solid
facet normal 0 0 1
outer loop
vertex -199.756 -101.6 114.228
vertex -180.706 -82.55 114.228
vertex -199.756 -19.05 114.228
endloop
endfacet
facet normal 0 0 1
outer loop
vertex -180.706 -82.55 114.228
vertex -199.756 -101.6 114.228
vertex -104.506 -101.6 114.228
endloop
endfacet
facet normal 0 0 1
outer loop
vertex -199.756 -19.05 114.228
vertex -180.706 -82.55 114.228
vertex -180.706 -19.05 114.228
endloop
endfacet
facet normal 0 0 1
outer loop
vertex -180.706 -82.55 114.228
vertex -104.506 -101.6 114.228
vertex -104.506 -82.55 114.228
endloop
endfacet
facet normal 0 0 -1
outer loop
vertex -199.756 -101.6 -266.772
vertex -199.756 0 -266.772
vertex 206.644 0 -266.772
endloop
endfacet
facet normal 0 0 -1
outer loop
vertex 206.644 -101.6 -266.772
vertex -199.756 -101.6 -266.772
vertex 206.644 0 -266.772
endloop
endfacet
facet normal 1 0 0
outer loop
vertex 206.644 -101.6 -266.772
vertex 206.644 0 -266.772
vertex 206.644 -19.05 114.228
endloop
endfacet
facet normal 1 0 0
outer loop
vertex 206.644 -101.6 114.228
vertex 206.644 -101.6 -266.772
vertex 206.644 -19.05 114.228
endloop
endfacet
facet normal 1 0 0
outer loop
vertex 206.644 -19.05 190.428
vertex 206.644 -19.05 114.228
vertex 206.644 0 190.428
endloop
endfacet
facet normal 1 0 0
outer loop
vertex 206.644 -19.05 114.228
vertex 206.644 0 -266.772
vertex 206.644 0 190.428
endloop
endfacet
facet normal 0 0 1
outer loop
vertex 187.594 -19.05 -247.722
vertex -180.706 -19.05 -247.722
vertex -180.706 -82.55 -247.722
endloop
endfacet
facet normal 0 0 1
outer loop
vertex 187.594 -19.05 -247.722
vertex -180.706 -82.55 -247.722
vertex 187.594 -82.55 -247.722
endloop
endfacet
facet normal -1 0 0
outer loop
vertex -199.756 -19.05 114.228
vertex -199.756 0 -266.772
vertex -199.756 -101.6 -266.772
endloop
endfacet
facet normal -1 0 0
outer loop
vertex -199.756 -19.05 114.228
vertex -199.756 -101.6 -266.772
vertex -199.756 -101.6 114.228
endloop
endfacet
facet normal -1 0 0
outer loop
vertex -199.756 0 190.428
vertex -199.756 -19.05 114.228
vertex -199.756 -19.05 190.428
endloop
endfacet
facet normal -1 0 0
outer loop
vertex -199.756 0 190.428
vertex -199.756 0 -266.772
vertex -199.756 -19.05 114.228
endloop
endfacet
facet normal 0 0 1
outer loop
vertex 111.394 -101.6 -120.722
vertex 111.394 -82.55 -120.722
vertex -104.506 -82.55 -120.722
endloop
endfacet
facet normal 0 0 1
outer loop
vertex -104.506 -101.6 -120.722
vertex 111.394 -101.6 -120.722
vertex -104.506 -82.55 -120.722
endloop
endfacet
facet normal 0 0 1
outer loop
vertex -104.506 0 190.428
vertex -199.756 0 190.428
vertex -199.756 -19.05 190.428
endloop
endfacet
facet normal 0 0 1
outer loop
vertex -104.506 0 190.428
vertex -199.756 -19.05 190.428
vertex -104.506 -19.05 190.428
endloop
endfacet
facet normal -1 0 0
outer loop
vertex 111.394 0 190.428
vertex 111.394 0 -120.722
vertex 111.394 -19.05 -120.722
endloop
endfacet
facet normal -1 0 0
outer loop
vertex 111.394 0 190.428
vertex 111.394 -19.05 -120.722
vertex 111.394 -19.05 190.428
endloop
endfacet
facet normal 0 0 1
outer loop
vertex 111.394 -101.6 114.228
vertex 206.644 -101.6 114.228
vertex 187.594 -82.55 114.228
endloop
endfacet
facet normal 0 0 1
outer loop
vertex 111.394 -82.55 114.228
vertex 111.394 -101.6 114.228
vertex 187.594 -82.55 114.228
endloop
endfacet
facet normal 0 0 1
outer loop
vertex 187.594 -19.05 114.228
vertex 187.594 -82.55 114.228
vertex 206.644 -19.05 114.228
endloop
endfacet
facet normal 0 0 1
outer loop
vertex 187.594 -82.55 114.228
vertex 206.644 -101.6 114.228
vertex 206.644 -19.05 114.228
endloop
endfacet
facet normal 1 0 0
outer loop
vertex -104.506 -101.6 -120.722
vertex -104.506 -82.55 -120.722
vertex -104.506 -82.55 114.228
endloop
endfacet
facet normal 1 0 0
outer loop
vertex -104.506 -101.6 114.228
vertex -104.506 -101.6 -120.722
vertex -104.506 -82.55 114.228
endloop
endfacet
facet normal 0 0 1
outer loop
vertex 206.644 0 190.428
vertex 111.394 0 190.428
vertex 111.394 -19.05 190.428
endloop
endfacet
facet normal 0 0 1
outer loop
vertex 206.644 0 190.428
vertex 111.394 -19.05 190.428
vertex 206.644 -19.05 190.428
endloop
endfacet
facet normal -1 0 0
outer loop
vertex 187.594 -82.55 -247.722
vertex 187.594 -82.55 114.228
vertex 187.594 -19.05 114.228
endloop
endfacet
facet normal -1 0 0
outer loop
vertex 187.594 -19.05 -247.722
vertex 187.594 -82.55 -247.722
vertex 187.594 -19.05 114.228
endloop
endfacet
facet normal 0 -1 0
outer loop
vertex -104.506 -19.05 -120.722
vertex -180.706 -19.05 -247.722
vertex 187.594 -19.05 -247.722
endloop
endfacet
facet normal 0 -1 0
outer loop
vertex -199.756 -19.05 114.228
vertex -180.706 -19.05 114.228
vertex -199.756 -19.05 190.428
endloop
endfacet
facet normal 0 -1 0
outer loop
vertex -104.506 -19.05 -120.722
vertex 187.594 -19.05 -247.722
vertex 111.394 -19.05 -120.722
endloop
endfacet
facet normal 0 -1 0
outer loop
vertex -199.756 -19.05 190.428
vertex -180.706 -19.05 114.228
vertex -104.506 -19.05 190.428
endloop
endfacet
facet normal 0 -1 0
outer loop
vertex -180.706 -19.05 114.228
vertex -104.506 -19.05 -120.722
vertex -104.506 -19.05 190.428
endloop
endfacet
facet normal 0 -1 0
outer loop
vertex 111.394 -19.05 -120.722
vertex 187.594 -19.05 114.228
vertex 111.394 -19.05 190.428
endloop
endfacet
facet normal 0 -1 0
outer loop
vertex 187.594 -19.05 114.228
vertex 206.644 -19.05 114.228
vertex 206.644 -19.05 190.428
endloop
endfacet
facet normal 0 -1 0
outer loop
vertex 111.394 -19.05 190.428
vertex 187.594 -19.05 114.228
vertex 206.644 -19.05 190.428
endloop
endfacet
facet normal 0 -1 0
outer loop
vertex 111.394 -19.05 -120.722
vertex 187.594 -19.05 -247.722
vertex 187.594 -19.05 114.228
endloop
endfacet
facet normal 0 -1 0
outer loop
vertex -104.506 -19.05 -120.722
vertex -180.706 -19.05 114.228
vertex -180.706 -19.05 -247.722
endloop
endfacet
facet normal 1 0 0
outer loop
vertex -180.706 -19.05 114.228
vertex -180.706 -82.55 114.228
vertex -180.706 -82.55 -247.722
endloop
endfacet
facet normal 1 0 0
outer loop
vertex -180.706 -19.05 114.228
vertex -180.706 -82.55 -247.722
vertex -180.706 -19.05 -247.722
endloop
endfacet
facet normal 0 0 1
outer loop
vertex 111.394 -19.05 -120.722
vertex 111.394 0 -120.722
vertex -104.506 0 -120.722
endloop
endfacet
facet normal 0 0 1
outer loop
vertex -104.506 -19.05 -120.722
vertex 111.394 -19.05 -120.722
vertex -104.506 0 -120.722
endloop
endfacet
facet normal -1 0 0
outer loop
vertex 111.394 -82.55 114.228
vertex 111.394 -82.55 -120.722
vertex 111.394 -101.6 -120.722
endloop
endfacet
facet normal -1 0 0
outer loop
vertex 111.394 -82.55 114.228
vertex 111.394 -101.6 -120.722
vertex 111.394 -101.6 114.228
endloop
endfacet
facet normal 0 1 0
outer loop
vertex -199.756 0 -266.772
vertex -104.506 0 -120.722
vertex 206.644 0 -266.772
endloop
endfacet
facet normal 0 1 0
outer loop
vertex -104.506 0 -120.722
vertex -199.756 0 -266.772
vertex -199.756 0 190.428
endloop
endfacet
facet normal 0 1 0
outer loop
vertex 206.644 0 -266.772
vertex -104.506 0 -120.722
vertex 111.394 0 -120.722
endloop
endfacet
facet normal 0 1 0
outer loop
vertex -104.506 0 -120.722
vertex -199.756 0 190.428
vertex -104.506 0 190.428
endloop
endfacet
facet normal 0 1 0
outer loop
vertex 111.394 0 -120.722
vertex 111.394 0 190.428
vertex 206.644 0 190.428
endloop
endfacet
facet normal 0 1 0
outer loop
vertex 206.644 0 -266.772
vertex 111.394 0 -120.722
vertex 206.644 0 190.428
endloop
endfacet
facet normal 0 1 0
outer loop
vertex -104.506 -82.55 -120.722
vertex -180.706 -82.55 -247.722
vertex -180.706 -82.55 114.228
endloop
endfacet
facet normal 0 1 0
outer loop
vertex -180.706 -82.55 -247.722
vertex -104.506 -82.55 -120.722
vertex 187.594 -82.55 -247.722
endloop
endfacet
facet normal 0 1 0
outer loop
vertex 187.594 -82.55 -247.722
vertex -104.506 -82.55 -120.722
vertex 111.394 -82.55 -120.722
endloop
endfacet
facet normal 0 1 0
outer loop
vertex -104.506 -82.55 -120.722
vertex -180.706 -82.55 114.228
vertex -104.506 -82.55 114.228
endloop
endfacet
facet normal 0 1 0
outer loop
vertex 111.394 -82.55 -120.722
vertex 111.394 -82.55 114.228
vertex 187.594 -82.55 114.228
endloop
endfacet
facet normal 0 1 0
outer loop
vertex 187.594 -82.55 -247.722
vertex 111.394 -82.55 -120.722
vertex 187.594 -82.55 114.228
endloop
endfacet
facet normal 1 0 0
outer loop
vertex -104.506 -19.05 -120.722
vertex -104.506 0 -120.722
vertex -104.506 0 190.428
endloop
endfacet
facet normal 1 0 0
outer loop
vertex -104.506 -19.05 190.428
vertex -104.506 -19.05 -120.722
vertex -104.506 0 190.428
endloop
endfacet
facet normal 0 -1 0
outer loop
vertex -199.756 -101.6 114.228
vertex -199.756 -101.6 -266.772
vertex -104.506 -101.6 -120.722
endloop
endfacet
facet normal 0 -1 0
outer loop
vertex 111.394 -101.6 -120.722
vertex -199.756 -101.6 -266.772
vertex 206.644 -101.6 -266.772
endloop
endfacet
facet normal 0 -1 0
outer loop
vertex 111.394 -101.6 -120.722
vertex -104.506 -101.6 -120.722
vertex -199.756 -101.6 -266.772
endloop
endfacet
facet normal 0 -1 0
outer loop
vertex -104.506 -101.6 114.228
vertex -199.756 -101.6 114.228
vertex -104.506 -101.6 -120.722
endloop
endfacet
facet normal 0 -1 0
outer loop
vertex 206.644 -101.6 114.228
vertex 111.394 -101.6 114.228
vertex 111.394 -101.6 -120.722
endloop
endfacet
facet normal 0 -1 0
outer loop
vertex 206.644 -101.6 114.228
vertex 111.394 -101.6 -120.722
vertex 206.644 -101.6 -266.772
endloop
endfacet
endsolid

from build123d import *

# Parameters (mm, degrees)
F0_W     = 406.4
F0_H     = 457.2
F1_DEPTH = 101.6
F2_W     = 82.55
F2_H     = 76.2
F3_DEPTH = 406.4
F4_W     = 368.3
F4_H     = 63.5
F5_DEPTH = 361.95
F6_W     = 215.9
F6_H     = 311.15
F7_DEPTH = 101.6


with BuildPart() as f1:
    # F0 (on Front) → F1 (new body)
    with BuildSketch(Plane.XZ):
        with Locations((3.443759, -38.172014)):
            Rectangle(F0_W, F0_H)
    extrude(amount=F1_DEPTH)

    # F2 (on face) → F3 (cut)
    with BuildSketch(Plane.YZ.offset(206.643759)):
        with Locations((-60.325, 152.327986)):
            Rectangle(F2_W, F2_H)
    extrude(amount=-F3_DEPTH, mode=Mode.SUBTRACT)

    # F4 (on face) → F5 (cut)
    with BuildSketch(Plane.XY.offset(114.227986)):
        with Locations((3.443759, -50.8)):
            Rectangle(F4_W, F4_H)
    extrude(amount=-F5_DEPTH, mode=Mode.SUBTRACT)

    # F6 (on face) → F7 (cut)
    with BuildSketch(Plane(origin=(0, 0, 0), x_dir=(-1, 0, 0), z_dir=(0, 1, 0))):
        with Locations((-3.443759, 34.852986)):
            Rectangle(F6_W, F6_H)
    extrude(amount=-F7_DEPTH, mode=Mode.SUBTRACT)


solid = f1.part
